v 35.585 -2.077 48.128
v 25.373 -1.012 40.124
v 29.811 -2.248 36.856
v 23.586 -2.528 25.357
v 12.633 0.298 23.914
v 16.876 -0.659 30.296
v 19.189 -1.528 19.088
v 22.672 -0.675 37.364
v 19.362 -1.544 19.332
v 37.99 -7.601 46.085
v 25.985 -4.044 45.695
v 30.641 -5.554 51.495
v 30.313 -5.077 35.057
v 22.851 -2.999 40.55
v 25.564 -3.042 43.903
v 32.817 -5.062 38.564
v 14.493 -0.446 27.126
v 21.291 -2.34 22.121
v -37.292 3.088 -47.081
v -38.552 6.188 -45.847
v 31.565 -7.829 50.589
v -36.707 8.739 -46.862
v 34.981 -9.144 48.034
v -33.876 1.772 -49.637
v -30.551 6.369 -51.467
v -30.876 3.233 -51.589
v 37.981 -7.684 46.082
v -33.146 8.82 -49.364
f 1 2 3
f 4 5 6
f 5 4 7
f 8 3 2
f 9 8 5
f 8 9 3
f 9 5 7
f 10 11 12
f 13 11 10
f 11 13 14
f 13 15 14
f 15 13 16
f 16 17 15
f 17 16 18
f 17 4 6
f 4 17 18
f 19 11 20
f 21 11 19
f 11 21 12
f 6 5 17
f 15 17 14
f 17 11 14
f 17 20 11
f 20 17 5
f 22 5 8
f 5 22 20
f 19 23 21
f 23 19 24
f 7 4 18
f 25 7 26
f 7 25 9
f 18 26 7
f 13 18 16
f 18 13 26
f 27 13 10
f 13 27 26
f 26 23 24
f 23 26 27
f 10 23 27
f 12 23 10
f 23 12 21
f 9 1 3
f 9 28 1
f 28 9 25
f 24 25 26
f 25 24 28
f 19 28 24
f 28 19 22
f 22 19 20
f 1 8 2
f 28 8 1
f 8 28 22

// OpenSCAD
TimbL=120;//[50:200]
TimbW=10;//[5:40]
rotate([rands(-50, 50, 1)[0],rands(-50, 50, 1)[0],rands(0, 90, 1)[0]]) translate([0,0,-TimbL*0.5])rotate([-90])

resize([TimbW*0.7,TimbL,TimbW]) timber();


module timber(){

color( [0.54,0.25,0.07]) 
    difference(){
     color( [0.54,0.25,0.07]) 
        rotate([90,0,0])rotate([0,0,45])        cylinder(1,$fn=floor(rands(4,8,1)[0]));
for(i=[1:rands(3,5,1)[0]]){
//translate([-rands(-.8,.8,1)[0],0,0])scale([1,rands(1,5,1)[0],1])rotate([0,0,45])cube([0.1,0.1,2],center=true);

translate([-rands(-.8,.8,1)[0],-1,0])scale([5,rands(1,5,1)[0],5])rotate([0,0,45])cube([0.1,0.1,2],center=true);}}

}
